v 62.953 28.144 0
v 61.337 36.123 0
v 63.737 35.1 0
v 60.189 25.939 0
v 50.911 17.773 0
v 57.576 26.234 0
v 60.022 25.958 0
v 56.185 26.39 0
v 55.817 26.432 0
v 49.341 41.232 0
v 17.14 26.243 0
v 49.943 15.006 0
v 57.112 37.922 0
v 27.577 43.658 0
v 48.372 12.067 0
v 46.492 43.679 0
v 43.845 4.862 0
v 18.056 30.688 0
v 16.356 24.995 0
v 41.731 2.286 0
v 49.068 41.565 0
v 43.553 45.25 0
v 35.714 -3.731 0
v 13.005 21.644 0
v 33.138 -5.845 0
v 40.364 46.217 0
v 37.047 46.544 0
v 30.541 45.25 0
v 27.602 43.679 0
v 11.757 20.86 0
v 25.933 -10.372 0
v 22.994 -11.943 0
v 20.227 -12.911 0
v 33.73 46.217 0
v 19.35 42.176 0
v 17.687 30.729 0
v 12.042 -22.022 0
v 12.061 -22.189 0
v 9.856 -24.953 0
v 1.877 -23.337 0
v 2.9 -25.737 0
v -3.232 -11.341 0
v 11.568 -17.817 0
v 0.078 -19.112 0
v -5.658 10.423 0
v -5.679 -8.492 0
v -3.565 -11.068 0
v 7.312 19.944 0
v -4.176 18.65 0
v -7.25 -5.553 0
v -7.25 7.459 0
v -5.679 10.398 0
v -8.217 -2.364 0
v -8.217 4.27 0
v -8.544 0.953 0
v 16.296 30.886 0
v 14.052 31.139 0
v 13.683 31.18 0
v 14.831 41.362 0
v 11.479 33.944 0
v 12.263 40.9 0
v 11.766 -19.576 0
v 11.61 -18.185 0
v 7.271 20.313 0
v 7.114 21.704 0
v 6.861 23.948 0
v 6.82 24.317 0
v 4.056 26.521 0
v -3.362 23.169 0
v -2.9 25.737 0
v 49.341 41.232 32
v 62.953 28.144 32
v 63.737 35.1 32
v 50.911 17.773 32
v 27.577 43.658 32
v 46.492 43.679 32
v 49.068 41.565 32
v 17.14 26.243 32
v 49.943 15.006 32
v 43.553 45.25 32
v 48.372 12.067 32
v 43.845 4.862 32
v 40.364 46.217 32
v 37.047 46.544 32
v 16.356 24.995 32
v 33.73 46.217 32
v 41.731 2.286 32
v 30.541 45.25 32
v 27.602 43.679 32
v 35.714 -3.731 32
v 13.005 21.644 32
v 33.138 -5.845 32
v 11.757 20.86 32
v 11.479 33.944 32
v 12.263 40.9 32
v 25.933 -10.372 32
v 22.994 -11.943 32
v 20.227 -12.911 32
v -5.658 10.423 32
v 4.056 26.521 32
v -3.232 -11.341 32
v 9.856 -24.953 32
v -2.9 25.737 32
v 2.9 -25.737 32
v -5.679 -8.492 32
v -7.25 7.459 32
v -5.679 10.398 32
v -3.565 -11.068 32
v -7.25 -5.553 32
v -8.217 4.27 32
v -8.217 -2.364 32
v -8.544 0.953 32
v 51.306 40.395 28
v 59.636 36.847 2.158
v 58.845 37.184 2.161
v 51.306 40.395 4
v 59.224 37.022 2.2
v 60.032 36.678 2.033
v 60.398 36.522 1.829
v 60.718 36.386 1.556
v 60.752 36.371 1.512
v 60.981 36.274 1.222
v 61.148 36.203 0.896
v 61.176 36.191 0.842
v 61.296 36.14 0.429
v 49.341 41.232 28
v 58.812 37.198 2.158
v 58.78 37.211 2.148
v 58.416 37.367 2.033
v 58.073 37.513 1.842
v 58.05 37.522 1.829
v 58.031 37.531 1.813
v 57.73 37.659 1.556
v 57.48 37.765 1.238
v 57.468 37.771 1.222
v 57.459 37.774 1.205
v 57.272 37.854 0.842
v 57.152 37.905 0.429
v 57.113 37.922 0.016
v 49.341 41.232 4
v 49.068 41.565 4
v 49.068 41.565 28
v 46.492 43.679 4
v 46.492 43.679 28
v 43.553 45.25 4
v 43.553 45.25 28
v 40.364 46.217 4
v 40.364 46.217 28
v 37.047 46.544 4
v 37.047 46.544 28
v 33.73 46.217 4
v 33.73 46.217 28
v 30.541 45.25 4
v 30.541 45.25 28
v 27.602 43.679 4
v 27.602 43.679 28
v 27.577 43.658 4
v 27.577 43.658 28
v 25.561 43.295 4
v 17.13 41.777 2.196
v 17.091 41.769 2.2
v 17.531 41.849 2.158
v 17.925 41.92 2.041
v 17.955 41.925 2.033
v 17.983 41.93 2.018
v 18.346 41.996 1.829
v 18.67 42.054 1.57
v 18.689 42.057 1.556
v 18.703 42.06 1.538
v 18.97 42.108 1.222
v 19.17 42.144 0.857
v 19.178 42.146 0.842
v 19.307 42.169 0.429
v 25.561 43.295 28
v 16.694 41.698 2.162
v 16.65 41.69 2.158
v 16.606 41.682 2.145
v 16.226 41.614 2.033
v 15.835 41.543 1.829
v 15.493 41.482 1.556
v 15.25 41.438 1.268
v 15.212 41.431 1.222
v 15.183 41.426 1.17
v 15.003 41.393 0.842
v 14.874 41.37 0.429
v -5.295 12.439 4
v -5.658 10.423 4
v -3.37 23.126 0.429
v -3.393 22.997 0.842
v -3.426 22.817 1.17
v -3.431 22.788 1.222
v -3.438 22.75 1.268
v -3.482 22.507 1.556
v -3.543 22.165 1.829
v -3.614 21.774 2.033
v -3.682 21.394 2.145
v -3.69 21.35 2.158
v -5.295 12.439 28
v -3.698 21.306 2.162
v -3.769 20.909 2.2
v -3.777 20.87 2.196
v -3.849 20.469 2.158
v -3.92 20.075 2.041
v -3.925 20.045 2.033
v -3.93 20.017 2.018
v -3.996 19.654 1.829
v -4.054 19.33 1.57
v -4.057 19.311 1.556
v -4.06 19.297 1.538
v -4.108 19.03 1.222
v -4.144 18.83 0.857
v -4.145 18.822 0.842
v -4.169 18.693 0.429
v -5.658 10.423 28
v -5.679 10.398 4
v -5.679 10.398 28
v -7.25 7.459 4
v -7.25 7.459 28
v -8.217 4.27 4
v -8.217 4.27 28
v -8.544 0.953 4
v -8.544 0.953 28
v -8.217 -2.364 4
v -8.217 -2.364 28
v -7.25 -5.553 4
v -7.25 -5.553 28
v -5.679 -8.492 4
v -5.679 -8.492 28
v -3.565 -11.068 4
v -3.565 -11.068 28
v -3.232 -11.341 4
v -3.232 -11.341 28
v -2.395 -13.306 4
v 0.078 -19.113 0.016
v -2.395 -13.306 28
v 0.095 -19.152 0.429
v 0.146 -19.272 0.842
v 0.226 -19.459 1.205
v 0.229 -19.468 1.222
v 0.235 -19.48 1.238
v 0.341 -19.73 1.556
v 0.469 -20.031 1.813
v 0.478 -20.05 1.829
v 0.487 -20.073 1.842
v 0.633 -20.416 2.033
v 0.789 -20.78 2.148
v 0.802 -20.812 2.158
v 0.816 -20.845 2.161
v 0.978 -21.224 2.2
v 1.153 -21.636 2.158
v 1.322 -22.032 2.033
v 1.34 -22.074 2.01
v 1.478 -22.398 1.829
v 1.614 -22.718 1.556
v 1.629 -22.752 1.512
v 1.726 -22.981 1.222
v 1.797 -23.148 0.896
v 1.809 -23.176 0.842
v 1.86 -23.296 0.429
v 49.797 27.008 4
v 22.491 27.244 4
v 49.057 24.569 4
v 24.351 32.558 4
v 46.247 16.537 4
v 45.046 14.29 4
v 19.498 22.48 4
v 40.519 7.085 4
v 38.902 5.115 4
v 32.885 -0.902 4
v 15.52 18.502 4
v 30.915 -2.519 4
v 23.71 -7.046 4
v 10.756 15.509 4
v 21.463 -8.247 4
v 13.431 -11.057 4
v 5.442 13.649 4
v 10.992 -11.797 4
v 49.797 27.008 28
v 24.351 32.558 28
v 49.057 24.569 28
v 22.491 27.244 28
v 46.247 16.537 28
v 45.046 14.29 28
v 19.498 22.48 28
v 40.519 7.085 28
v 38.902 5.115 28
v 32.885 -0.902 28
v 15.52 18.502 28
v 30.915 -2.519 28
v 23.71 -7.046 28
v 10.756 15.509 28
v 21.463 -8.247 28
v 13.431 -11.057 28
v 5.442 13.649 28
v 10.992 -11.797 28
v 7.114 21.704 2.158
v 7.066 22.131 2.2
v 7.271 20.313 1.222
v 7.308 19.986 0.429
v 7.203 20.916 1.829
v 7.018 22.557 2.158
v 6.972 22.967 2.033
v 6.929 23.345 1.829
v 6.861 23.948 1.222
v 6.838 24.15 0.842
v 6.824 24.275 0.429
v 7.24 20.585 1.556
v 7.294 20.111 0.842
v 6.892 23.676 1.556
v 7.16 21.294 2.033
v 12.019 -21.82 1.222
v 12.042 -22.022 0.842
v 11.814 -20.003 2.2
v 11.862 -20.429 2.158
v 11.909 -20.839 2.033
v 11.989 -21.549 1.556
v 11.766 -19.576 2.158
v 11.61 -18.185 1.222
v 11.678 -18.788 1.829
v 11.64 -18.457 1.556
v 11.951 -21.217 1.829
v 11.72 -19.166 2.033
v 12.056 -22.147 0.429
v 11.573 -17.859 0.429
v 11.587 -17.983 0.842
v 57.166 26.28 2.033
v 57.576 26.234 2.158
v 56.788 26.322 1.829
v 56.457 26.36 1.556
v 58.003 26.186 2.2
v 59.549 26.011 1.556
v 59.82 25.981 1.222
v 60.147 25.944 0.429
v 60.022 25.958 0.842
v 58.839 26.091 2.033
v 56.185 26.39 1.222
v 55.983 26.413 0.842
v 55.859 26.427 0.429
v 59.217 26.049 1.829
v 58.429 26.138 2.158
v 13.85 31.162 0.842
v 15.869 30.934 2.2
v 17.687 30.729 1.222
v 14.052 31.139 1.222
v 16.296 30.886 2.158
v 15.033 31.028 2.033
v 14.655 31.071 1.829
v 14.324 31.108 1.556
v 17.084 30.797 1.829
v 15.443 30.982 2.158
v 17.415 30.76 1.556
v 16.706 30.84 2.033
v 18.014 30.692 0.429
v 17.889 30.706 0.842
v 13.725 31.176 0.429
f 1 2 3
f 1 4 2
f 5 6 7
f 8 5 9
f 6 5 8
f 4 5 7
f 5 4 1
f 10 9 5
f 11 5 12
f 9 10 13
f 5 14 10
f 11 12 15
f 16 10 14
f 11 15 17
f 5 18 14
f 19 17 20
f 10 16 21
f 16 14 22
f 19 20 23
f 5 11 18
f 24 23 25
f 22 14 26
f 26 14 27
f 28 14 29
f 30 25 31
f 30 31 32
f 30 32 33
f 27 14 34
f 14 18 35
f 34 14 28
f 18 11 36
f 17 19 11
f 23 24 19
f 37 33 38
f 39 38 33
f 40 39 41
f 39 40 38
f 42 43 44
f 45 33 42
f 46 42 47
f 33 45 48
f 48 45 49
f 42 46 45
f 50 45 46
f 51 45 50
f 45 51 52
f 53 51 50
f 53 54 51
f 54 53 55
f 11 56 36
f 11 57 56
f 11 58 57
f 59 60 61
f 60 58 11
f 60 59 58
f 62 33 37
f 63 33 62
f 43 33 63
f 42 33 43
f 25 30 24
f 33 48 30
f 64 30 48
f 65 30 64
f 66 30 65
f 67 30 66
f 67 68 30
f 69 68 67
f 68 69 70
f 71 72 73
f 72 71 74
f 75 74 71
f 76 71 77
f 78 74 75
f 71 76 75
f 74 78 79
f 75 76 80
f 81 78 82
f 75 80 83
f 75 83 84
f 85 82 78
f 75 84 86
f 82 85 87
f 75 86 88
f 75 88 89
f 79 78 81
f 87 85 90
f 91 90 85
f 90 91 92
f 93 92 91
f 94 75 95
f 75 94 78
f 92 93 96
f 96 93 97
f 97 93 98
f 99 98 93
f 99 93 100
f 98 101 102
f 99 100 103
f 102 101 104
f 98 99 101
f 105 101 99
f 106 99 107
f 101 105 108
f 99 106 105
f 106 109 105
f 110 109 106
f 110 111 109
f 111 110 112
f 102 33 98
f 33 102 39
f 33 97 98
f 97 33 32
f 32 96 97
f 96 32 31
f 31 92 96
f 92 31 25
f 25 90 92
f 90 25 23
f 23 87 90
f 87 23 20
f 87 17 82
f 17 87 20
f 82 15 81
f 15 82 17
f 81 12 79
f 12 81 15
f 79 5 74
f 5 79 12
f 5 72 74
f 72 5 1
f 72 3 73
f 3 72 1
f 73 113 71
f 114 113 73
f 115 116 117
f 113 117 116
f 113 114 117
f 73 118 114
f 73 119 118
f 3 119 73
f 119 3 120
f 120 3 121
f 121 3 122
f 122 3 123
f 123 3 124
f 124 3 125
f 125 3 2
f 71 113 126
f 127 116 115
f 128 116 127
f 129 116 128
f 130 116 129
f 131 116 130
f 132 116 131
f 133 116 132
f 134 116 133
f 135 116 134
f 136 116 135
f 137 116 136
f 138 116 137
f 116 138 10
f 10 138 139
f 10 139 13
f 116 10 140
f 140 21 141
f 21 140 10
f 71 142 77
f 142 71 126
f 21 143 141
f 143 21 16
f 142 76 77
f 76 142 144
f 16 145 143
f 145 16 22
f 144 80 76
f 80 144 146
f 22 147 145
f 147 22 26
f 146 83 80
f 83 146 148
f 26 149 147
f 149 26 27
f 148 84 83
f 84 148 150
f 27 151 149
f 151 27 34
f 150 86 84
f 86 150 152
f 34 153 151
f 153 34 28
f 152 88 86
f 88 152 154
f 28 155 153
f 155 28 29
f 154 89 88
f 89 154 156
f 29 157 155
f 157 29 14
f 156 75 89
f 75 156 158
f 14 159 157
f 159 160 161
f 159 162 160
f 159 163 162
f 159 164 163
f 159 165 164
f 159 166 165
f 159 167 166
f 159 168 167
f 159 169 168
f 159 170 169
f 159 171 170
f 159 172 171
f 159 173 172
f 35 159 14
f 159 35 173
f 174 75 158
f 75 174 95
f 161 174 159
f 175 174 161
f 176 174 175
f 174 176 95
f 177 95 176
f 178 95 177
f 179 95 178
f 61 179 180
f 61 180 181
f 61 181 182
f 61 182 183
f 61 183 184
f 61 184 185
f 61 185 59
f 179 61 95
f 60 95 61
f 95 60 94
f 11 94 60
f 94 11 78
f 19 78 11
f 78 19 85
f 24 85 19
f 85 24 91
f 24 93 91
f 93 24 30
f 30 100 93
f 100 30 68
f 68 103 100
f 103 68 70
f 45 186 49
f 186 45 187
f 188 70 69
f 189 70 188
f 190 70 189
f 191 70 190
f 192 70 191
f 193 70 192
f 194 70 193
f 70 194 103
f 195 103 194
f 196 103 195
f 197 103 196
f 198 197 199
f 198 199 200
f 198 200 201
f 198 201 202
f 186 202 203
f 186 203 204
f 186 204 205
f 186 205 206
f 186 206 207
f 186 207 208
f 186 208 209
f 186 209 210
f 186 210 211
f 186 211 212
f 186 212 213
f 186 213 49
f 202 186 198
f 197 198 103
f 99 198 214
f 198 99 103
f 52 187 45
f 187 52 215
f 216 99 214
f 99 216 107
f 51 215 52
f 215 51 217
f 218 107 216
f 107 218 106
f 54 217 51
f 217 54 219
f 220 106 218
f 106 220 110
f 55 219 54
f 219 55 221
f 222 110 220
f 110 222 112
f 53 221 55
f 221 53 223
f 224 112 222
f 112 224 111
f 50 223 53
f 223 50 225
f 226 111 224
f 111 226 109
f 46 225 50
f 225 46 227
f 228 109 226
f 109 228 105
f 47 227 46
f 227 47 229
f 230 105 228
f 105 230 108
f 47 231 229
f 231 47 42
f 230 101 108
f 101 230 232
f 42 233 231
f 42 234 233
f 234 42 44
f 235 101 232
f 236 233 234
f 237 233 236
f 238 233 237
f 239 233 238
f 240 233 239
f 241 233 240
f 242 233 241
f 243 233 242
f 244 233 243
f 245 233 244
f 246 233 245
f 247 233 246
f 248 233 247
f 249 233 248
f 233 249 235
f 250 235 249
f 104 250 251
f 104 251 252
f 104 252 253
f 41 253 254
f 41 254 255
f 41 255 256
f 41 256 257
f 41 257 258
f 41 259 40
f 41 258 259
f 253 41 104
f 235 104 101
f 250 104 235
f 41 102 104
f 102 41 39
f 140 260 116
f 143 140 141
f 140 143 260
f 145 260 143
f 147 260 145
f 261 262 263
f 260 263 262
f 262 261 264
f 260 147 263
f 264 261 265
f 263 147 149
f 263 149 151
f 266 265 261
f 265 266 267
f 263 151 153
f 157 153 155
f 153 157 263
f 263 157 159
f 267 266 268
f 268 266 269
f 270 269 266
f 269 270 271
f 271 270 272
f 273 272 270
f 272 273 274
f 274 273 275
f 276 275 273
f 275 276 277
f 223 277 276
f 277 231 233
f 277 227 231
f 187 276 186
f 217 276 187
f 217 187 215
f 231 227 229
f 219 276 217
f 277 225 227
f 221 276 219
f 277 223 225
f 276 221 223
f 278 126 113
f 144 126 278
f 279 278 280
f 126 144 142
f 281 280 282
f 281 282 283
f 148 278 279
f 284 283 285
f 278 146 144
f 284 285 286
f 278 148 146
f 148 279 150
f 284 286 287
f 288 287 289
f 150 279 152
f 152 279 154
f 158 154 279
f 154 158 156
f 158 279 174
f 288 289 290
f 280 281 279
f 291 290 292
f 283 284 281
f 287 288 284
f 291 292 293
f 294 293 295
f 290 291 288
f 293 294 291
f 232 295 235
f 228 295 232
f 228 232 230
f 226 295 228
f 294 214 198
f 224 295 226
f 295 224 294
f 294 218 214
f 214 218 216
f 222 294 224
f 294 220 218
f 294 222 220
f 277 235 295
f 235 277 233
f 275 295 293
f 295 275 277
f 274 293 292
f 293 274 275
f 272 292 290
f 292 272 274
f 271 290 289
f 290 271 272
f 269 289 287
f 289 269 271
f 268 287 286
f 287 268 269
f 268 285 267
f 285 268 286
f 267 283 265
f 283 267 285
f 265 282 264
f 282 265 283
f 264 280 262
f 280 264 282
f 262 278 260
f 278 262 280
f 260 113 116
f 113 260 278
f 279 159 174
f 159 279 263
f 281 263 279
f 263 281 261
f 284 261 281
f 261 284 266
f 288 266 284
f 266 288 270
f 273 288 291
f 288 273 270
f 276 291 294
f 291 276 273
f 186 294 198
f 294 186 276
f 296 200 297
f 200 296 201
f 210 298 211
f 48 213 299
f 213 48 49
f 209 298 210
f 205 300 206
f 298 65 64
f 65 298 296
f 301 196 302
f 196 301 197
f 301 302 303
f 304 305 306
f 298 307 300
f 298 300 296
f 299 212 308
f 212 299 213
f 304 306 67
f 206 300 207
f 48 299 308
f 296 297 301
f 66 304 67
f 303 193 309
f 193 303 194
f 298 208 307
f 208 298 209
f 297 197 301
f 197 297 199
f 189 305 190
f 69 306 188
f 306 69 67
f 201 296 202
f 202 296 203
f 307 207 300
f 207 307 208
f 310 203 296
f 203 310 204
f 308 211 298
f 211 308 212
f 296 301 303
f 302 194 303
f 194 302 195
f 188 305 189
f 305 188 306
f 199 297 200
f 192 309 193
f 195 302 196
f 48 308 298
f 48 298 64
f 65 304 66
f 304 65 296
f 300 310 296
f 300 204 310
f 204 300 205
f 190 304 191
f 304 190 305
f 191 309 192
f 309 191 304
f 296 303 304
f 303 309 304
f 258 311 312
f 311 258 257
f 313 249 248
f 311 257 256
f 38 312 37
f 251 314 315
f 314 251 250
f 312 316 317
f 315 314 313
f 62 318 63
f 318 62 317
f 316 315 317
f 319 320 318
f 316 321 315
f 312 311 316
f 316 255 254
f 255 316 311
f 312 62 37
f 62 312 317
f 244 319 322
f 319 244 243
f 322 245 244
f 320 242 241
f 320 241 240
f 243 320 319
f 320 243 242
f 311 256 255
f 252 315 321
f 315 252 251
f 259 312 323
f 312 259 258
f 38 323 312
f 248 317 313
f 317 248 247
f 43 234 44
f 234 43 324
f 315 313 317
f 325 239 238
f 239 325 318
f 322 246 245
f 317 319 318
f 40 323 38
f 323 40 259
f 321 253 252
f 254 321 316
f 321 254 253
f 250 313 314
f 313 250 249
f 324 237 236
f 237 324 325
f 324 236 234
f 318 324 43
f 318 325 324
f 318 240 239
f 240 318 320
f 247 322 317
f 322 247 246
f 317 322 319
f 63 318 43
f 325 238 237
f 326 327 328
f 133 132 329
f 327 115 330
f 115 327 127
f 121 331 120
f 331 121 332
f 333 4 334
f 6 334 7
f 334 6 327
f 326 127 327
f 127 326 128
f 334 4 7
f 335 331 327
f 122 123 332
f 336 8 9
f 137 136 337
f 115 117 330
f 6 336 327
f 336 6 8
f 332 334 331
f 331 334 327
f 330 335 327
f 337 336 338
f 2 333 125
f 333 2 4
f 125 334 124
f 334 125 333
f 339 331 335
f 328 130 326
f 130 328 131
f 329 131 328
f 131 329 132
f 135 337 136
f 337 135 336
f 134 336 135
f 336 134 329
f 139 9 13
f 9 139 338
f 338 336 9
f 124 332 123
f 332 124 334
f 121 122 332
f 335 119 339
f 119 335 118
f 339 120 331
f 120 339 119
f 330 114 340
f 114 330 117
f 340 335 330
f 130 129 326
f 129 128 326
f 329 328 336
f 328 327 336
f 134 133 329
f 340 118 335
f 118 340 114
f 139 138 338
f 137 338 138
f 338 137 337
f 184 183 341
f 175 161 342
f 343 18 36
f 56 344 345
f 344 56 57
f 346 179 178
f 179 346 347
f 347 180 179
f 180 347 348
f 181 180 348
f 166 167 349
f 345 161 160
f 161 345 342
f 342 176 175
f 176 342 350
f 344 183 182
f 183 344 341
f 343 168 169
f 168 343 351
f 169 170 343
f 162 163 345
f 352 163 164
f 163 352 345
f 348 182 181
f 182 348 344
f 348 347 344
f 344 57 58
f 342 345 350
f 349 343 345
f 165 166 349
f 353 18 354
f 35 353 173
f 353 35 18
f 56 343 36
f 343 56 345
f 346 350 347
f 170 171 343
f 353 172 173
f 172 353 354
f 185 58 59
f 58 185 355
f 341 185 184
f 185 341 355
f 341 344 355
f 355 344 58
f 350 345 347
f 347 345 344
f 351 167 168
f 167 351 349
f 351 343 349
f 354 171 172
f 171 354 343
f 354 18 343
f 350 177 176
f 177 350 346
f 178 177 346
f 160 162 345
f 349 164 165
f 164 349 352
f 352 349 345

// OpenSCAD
$fn = 32;

// ----------------------------------------------------------------------
// Air duct: 34 mm duct, 4 mm wall, 32 mm across
// ----------------------------------------------------------------------

// --- parameters (mm) ---
duct_r = 17;              // duct core radius
duct_d = 34;              // duct core diameter
wall = 4;                 // duct wall thickness
height = 32;              // duct width (extrusion height)
port_r = 25.9;            // port flange half width
port_d = 51.8;            // port flange width
port_t = 7;               // port flange thickness
bolt_d = 4.4;             // port bolt holes
bolt_offset = 21.2;       // bolt hole offset from the port axis

difference() {
  /* outer hull chain: tube with a flat flange plate at every port */
  linear_extrude(height = 32) {
    hull() {
      polygon([[2.9, -25.737], [-2.9, 25.737], [4.056, 26.521], [9.856, -24.953]]);
      translate([9.937, 1.12]) circle(r = 17);
    }
    hull() {
      translate([9.937, 1.12]) circle(r = 17);
      translate([8.456, 0.953]) circle(r = 17);
    }
    hull() {
      translate([8.456, 0.953]) circle(r = 17);
      translate([16.488, 3.763]) circle(r = 17);
    }
    hull() {
      translate([16.488, 3.763]) circle(r = 17);
      translate([23.693, 8.29]) circle(r = 17);
    }
    hull() {
      translate([23.693, 8.29]) circle(r = 17);
      translate([29.71, 14.307]) circle(r = 17);
    }
    hull() {
      translate([29.71, 14.307]) circle(r = 17);
      translate([34.237, 21.512]) circle(r = 17);
    }
    hull() {
      translate([34.237, 21.512]) circle(r = 17);
      translate([37.047, 29.544]) circle(r = 17);
    }
    hull() {
      translate([37.047, 29.544]) circle(r = 17);
      translate([36.88, 28.063]) circle(r = 17);
    }
    hull() {
      translate([36.88, 28.063]) circle(r = 17);
      polygon([[12.263, 40.9], [63.737, 35.1], [62.953, 28.144], [11.479, 33.944]]);
    }
  }
  /* air passage: the same chain inset by the wall, 5 mm proud of the ports */
  translate([0, 0, 4]) linear_extrude(height = 24) {
    hull() {
      translate([-4.969, -0.56]) circle(r = 13);
      translate([8.456, 0.953]) circle(r = 13);
    }
    hull() {
      translate([8.456, 0.953]) circle(r = 13);
      translate([16.488, 3.763]) circle(r = 13);
    }
    hull() {
      translate([16.488, 3.763]) circle(r = 13);
      translate([23.693, 8.29]) circle(r = 13);
    }
    hull() {
      translate([23.693, 8.29]) circle(r = 13);
      translate([29.71, 14.307]) circle(r = 13);
    }
    hull() {
      translate([29.71, 14.307]) circle(r = 13);
      translate([34.237, 21.512]) circle(r = 13);
    }
    hull() {
      translate([34.237, 21.512]) circle(r = 13);
      translate([37.047, 29.544]) circle(r = 13);
    }
    hull() {
      translate([37.047, 29.544]) circle(r = 13);
      translate([38.56, 42.969]) circle(r = 13);
    }
  }
  translate([0, 0]) rotate([0, 0, -83.57]) translate([-21.2, -2.5]) rotate([-90, 0, 0]) cylinder(h = 12, d = 4.4);
  translate([0, 0]) rotate([0, 0, -83.57]) translate([21.2, -2.5]) rotate([-90, 0, 0]) cylinder(h = 12, d = 4.4);
  translate([38, 38]) rotate([0, 0, 173.57]) translate([-21.2, -2.5]) rotate([-90, 0, 0]) cylinder(h = 12, d = 4.4);
  translate([38, 38]) rotate([0, 0, 173.57]) translate([21.2, -2.5]) rotate([-90, 0, 0]) cylinder(h = 12, d = 4.4);
}
